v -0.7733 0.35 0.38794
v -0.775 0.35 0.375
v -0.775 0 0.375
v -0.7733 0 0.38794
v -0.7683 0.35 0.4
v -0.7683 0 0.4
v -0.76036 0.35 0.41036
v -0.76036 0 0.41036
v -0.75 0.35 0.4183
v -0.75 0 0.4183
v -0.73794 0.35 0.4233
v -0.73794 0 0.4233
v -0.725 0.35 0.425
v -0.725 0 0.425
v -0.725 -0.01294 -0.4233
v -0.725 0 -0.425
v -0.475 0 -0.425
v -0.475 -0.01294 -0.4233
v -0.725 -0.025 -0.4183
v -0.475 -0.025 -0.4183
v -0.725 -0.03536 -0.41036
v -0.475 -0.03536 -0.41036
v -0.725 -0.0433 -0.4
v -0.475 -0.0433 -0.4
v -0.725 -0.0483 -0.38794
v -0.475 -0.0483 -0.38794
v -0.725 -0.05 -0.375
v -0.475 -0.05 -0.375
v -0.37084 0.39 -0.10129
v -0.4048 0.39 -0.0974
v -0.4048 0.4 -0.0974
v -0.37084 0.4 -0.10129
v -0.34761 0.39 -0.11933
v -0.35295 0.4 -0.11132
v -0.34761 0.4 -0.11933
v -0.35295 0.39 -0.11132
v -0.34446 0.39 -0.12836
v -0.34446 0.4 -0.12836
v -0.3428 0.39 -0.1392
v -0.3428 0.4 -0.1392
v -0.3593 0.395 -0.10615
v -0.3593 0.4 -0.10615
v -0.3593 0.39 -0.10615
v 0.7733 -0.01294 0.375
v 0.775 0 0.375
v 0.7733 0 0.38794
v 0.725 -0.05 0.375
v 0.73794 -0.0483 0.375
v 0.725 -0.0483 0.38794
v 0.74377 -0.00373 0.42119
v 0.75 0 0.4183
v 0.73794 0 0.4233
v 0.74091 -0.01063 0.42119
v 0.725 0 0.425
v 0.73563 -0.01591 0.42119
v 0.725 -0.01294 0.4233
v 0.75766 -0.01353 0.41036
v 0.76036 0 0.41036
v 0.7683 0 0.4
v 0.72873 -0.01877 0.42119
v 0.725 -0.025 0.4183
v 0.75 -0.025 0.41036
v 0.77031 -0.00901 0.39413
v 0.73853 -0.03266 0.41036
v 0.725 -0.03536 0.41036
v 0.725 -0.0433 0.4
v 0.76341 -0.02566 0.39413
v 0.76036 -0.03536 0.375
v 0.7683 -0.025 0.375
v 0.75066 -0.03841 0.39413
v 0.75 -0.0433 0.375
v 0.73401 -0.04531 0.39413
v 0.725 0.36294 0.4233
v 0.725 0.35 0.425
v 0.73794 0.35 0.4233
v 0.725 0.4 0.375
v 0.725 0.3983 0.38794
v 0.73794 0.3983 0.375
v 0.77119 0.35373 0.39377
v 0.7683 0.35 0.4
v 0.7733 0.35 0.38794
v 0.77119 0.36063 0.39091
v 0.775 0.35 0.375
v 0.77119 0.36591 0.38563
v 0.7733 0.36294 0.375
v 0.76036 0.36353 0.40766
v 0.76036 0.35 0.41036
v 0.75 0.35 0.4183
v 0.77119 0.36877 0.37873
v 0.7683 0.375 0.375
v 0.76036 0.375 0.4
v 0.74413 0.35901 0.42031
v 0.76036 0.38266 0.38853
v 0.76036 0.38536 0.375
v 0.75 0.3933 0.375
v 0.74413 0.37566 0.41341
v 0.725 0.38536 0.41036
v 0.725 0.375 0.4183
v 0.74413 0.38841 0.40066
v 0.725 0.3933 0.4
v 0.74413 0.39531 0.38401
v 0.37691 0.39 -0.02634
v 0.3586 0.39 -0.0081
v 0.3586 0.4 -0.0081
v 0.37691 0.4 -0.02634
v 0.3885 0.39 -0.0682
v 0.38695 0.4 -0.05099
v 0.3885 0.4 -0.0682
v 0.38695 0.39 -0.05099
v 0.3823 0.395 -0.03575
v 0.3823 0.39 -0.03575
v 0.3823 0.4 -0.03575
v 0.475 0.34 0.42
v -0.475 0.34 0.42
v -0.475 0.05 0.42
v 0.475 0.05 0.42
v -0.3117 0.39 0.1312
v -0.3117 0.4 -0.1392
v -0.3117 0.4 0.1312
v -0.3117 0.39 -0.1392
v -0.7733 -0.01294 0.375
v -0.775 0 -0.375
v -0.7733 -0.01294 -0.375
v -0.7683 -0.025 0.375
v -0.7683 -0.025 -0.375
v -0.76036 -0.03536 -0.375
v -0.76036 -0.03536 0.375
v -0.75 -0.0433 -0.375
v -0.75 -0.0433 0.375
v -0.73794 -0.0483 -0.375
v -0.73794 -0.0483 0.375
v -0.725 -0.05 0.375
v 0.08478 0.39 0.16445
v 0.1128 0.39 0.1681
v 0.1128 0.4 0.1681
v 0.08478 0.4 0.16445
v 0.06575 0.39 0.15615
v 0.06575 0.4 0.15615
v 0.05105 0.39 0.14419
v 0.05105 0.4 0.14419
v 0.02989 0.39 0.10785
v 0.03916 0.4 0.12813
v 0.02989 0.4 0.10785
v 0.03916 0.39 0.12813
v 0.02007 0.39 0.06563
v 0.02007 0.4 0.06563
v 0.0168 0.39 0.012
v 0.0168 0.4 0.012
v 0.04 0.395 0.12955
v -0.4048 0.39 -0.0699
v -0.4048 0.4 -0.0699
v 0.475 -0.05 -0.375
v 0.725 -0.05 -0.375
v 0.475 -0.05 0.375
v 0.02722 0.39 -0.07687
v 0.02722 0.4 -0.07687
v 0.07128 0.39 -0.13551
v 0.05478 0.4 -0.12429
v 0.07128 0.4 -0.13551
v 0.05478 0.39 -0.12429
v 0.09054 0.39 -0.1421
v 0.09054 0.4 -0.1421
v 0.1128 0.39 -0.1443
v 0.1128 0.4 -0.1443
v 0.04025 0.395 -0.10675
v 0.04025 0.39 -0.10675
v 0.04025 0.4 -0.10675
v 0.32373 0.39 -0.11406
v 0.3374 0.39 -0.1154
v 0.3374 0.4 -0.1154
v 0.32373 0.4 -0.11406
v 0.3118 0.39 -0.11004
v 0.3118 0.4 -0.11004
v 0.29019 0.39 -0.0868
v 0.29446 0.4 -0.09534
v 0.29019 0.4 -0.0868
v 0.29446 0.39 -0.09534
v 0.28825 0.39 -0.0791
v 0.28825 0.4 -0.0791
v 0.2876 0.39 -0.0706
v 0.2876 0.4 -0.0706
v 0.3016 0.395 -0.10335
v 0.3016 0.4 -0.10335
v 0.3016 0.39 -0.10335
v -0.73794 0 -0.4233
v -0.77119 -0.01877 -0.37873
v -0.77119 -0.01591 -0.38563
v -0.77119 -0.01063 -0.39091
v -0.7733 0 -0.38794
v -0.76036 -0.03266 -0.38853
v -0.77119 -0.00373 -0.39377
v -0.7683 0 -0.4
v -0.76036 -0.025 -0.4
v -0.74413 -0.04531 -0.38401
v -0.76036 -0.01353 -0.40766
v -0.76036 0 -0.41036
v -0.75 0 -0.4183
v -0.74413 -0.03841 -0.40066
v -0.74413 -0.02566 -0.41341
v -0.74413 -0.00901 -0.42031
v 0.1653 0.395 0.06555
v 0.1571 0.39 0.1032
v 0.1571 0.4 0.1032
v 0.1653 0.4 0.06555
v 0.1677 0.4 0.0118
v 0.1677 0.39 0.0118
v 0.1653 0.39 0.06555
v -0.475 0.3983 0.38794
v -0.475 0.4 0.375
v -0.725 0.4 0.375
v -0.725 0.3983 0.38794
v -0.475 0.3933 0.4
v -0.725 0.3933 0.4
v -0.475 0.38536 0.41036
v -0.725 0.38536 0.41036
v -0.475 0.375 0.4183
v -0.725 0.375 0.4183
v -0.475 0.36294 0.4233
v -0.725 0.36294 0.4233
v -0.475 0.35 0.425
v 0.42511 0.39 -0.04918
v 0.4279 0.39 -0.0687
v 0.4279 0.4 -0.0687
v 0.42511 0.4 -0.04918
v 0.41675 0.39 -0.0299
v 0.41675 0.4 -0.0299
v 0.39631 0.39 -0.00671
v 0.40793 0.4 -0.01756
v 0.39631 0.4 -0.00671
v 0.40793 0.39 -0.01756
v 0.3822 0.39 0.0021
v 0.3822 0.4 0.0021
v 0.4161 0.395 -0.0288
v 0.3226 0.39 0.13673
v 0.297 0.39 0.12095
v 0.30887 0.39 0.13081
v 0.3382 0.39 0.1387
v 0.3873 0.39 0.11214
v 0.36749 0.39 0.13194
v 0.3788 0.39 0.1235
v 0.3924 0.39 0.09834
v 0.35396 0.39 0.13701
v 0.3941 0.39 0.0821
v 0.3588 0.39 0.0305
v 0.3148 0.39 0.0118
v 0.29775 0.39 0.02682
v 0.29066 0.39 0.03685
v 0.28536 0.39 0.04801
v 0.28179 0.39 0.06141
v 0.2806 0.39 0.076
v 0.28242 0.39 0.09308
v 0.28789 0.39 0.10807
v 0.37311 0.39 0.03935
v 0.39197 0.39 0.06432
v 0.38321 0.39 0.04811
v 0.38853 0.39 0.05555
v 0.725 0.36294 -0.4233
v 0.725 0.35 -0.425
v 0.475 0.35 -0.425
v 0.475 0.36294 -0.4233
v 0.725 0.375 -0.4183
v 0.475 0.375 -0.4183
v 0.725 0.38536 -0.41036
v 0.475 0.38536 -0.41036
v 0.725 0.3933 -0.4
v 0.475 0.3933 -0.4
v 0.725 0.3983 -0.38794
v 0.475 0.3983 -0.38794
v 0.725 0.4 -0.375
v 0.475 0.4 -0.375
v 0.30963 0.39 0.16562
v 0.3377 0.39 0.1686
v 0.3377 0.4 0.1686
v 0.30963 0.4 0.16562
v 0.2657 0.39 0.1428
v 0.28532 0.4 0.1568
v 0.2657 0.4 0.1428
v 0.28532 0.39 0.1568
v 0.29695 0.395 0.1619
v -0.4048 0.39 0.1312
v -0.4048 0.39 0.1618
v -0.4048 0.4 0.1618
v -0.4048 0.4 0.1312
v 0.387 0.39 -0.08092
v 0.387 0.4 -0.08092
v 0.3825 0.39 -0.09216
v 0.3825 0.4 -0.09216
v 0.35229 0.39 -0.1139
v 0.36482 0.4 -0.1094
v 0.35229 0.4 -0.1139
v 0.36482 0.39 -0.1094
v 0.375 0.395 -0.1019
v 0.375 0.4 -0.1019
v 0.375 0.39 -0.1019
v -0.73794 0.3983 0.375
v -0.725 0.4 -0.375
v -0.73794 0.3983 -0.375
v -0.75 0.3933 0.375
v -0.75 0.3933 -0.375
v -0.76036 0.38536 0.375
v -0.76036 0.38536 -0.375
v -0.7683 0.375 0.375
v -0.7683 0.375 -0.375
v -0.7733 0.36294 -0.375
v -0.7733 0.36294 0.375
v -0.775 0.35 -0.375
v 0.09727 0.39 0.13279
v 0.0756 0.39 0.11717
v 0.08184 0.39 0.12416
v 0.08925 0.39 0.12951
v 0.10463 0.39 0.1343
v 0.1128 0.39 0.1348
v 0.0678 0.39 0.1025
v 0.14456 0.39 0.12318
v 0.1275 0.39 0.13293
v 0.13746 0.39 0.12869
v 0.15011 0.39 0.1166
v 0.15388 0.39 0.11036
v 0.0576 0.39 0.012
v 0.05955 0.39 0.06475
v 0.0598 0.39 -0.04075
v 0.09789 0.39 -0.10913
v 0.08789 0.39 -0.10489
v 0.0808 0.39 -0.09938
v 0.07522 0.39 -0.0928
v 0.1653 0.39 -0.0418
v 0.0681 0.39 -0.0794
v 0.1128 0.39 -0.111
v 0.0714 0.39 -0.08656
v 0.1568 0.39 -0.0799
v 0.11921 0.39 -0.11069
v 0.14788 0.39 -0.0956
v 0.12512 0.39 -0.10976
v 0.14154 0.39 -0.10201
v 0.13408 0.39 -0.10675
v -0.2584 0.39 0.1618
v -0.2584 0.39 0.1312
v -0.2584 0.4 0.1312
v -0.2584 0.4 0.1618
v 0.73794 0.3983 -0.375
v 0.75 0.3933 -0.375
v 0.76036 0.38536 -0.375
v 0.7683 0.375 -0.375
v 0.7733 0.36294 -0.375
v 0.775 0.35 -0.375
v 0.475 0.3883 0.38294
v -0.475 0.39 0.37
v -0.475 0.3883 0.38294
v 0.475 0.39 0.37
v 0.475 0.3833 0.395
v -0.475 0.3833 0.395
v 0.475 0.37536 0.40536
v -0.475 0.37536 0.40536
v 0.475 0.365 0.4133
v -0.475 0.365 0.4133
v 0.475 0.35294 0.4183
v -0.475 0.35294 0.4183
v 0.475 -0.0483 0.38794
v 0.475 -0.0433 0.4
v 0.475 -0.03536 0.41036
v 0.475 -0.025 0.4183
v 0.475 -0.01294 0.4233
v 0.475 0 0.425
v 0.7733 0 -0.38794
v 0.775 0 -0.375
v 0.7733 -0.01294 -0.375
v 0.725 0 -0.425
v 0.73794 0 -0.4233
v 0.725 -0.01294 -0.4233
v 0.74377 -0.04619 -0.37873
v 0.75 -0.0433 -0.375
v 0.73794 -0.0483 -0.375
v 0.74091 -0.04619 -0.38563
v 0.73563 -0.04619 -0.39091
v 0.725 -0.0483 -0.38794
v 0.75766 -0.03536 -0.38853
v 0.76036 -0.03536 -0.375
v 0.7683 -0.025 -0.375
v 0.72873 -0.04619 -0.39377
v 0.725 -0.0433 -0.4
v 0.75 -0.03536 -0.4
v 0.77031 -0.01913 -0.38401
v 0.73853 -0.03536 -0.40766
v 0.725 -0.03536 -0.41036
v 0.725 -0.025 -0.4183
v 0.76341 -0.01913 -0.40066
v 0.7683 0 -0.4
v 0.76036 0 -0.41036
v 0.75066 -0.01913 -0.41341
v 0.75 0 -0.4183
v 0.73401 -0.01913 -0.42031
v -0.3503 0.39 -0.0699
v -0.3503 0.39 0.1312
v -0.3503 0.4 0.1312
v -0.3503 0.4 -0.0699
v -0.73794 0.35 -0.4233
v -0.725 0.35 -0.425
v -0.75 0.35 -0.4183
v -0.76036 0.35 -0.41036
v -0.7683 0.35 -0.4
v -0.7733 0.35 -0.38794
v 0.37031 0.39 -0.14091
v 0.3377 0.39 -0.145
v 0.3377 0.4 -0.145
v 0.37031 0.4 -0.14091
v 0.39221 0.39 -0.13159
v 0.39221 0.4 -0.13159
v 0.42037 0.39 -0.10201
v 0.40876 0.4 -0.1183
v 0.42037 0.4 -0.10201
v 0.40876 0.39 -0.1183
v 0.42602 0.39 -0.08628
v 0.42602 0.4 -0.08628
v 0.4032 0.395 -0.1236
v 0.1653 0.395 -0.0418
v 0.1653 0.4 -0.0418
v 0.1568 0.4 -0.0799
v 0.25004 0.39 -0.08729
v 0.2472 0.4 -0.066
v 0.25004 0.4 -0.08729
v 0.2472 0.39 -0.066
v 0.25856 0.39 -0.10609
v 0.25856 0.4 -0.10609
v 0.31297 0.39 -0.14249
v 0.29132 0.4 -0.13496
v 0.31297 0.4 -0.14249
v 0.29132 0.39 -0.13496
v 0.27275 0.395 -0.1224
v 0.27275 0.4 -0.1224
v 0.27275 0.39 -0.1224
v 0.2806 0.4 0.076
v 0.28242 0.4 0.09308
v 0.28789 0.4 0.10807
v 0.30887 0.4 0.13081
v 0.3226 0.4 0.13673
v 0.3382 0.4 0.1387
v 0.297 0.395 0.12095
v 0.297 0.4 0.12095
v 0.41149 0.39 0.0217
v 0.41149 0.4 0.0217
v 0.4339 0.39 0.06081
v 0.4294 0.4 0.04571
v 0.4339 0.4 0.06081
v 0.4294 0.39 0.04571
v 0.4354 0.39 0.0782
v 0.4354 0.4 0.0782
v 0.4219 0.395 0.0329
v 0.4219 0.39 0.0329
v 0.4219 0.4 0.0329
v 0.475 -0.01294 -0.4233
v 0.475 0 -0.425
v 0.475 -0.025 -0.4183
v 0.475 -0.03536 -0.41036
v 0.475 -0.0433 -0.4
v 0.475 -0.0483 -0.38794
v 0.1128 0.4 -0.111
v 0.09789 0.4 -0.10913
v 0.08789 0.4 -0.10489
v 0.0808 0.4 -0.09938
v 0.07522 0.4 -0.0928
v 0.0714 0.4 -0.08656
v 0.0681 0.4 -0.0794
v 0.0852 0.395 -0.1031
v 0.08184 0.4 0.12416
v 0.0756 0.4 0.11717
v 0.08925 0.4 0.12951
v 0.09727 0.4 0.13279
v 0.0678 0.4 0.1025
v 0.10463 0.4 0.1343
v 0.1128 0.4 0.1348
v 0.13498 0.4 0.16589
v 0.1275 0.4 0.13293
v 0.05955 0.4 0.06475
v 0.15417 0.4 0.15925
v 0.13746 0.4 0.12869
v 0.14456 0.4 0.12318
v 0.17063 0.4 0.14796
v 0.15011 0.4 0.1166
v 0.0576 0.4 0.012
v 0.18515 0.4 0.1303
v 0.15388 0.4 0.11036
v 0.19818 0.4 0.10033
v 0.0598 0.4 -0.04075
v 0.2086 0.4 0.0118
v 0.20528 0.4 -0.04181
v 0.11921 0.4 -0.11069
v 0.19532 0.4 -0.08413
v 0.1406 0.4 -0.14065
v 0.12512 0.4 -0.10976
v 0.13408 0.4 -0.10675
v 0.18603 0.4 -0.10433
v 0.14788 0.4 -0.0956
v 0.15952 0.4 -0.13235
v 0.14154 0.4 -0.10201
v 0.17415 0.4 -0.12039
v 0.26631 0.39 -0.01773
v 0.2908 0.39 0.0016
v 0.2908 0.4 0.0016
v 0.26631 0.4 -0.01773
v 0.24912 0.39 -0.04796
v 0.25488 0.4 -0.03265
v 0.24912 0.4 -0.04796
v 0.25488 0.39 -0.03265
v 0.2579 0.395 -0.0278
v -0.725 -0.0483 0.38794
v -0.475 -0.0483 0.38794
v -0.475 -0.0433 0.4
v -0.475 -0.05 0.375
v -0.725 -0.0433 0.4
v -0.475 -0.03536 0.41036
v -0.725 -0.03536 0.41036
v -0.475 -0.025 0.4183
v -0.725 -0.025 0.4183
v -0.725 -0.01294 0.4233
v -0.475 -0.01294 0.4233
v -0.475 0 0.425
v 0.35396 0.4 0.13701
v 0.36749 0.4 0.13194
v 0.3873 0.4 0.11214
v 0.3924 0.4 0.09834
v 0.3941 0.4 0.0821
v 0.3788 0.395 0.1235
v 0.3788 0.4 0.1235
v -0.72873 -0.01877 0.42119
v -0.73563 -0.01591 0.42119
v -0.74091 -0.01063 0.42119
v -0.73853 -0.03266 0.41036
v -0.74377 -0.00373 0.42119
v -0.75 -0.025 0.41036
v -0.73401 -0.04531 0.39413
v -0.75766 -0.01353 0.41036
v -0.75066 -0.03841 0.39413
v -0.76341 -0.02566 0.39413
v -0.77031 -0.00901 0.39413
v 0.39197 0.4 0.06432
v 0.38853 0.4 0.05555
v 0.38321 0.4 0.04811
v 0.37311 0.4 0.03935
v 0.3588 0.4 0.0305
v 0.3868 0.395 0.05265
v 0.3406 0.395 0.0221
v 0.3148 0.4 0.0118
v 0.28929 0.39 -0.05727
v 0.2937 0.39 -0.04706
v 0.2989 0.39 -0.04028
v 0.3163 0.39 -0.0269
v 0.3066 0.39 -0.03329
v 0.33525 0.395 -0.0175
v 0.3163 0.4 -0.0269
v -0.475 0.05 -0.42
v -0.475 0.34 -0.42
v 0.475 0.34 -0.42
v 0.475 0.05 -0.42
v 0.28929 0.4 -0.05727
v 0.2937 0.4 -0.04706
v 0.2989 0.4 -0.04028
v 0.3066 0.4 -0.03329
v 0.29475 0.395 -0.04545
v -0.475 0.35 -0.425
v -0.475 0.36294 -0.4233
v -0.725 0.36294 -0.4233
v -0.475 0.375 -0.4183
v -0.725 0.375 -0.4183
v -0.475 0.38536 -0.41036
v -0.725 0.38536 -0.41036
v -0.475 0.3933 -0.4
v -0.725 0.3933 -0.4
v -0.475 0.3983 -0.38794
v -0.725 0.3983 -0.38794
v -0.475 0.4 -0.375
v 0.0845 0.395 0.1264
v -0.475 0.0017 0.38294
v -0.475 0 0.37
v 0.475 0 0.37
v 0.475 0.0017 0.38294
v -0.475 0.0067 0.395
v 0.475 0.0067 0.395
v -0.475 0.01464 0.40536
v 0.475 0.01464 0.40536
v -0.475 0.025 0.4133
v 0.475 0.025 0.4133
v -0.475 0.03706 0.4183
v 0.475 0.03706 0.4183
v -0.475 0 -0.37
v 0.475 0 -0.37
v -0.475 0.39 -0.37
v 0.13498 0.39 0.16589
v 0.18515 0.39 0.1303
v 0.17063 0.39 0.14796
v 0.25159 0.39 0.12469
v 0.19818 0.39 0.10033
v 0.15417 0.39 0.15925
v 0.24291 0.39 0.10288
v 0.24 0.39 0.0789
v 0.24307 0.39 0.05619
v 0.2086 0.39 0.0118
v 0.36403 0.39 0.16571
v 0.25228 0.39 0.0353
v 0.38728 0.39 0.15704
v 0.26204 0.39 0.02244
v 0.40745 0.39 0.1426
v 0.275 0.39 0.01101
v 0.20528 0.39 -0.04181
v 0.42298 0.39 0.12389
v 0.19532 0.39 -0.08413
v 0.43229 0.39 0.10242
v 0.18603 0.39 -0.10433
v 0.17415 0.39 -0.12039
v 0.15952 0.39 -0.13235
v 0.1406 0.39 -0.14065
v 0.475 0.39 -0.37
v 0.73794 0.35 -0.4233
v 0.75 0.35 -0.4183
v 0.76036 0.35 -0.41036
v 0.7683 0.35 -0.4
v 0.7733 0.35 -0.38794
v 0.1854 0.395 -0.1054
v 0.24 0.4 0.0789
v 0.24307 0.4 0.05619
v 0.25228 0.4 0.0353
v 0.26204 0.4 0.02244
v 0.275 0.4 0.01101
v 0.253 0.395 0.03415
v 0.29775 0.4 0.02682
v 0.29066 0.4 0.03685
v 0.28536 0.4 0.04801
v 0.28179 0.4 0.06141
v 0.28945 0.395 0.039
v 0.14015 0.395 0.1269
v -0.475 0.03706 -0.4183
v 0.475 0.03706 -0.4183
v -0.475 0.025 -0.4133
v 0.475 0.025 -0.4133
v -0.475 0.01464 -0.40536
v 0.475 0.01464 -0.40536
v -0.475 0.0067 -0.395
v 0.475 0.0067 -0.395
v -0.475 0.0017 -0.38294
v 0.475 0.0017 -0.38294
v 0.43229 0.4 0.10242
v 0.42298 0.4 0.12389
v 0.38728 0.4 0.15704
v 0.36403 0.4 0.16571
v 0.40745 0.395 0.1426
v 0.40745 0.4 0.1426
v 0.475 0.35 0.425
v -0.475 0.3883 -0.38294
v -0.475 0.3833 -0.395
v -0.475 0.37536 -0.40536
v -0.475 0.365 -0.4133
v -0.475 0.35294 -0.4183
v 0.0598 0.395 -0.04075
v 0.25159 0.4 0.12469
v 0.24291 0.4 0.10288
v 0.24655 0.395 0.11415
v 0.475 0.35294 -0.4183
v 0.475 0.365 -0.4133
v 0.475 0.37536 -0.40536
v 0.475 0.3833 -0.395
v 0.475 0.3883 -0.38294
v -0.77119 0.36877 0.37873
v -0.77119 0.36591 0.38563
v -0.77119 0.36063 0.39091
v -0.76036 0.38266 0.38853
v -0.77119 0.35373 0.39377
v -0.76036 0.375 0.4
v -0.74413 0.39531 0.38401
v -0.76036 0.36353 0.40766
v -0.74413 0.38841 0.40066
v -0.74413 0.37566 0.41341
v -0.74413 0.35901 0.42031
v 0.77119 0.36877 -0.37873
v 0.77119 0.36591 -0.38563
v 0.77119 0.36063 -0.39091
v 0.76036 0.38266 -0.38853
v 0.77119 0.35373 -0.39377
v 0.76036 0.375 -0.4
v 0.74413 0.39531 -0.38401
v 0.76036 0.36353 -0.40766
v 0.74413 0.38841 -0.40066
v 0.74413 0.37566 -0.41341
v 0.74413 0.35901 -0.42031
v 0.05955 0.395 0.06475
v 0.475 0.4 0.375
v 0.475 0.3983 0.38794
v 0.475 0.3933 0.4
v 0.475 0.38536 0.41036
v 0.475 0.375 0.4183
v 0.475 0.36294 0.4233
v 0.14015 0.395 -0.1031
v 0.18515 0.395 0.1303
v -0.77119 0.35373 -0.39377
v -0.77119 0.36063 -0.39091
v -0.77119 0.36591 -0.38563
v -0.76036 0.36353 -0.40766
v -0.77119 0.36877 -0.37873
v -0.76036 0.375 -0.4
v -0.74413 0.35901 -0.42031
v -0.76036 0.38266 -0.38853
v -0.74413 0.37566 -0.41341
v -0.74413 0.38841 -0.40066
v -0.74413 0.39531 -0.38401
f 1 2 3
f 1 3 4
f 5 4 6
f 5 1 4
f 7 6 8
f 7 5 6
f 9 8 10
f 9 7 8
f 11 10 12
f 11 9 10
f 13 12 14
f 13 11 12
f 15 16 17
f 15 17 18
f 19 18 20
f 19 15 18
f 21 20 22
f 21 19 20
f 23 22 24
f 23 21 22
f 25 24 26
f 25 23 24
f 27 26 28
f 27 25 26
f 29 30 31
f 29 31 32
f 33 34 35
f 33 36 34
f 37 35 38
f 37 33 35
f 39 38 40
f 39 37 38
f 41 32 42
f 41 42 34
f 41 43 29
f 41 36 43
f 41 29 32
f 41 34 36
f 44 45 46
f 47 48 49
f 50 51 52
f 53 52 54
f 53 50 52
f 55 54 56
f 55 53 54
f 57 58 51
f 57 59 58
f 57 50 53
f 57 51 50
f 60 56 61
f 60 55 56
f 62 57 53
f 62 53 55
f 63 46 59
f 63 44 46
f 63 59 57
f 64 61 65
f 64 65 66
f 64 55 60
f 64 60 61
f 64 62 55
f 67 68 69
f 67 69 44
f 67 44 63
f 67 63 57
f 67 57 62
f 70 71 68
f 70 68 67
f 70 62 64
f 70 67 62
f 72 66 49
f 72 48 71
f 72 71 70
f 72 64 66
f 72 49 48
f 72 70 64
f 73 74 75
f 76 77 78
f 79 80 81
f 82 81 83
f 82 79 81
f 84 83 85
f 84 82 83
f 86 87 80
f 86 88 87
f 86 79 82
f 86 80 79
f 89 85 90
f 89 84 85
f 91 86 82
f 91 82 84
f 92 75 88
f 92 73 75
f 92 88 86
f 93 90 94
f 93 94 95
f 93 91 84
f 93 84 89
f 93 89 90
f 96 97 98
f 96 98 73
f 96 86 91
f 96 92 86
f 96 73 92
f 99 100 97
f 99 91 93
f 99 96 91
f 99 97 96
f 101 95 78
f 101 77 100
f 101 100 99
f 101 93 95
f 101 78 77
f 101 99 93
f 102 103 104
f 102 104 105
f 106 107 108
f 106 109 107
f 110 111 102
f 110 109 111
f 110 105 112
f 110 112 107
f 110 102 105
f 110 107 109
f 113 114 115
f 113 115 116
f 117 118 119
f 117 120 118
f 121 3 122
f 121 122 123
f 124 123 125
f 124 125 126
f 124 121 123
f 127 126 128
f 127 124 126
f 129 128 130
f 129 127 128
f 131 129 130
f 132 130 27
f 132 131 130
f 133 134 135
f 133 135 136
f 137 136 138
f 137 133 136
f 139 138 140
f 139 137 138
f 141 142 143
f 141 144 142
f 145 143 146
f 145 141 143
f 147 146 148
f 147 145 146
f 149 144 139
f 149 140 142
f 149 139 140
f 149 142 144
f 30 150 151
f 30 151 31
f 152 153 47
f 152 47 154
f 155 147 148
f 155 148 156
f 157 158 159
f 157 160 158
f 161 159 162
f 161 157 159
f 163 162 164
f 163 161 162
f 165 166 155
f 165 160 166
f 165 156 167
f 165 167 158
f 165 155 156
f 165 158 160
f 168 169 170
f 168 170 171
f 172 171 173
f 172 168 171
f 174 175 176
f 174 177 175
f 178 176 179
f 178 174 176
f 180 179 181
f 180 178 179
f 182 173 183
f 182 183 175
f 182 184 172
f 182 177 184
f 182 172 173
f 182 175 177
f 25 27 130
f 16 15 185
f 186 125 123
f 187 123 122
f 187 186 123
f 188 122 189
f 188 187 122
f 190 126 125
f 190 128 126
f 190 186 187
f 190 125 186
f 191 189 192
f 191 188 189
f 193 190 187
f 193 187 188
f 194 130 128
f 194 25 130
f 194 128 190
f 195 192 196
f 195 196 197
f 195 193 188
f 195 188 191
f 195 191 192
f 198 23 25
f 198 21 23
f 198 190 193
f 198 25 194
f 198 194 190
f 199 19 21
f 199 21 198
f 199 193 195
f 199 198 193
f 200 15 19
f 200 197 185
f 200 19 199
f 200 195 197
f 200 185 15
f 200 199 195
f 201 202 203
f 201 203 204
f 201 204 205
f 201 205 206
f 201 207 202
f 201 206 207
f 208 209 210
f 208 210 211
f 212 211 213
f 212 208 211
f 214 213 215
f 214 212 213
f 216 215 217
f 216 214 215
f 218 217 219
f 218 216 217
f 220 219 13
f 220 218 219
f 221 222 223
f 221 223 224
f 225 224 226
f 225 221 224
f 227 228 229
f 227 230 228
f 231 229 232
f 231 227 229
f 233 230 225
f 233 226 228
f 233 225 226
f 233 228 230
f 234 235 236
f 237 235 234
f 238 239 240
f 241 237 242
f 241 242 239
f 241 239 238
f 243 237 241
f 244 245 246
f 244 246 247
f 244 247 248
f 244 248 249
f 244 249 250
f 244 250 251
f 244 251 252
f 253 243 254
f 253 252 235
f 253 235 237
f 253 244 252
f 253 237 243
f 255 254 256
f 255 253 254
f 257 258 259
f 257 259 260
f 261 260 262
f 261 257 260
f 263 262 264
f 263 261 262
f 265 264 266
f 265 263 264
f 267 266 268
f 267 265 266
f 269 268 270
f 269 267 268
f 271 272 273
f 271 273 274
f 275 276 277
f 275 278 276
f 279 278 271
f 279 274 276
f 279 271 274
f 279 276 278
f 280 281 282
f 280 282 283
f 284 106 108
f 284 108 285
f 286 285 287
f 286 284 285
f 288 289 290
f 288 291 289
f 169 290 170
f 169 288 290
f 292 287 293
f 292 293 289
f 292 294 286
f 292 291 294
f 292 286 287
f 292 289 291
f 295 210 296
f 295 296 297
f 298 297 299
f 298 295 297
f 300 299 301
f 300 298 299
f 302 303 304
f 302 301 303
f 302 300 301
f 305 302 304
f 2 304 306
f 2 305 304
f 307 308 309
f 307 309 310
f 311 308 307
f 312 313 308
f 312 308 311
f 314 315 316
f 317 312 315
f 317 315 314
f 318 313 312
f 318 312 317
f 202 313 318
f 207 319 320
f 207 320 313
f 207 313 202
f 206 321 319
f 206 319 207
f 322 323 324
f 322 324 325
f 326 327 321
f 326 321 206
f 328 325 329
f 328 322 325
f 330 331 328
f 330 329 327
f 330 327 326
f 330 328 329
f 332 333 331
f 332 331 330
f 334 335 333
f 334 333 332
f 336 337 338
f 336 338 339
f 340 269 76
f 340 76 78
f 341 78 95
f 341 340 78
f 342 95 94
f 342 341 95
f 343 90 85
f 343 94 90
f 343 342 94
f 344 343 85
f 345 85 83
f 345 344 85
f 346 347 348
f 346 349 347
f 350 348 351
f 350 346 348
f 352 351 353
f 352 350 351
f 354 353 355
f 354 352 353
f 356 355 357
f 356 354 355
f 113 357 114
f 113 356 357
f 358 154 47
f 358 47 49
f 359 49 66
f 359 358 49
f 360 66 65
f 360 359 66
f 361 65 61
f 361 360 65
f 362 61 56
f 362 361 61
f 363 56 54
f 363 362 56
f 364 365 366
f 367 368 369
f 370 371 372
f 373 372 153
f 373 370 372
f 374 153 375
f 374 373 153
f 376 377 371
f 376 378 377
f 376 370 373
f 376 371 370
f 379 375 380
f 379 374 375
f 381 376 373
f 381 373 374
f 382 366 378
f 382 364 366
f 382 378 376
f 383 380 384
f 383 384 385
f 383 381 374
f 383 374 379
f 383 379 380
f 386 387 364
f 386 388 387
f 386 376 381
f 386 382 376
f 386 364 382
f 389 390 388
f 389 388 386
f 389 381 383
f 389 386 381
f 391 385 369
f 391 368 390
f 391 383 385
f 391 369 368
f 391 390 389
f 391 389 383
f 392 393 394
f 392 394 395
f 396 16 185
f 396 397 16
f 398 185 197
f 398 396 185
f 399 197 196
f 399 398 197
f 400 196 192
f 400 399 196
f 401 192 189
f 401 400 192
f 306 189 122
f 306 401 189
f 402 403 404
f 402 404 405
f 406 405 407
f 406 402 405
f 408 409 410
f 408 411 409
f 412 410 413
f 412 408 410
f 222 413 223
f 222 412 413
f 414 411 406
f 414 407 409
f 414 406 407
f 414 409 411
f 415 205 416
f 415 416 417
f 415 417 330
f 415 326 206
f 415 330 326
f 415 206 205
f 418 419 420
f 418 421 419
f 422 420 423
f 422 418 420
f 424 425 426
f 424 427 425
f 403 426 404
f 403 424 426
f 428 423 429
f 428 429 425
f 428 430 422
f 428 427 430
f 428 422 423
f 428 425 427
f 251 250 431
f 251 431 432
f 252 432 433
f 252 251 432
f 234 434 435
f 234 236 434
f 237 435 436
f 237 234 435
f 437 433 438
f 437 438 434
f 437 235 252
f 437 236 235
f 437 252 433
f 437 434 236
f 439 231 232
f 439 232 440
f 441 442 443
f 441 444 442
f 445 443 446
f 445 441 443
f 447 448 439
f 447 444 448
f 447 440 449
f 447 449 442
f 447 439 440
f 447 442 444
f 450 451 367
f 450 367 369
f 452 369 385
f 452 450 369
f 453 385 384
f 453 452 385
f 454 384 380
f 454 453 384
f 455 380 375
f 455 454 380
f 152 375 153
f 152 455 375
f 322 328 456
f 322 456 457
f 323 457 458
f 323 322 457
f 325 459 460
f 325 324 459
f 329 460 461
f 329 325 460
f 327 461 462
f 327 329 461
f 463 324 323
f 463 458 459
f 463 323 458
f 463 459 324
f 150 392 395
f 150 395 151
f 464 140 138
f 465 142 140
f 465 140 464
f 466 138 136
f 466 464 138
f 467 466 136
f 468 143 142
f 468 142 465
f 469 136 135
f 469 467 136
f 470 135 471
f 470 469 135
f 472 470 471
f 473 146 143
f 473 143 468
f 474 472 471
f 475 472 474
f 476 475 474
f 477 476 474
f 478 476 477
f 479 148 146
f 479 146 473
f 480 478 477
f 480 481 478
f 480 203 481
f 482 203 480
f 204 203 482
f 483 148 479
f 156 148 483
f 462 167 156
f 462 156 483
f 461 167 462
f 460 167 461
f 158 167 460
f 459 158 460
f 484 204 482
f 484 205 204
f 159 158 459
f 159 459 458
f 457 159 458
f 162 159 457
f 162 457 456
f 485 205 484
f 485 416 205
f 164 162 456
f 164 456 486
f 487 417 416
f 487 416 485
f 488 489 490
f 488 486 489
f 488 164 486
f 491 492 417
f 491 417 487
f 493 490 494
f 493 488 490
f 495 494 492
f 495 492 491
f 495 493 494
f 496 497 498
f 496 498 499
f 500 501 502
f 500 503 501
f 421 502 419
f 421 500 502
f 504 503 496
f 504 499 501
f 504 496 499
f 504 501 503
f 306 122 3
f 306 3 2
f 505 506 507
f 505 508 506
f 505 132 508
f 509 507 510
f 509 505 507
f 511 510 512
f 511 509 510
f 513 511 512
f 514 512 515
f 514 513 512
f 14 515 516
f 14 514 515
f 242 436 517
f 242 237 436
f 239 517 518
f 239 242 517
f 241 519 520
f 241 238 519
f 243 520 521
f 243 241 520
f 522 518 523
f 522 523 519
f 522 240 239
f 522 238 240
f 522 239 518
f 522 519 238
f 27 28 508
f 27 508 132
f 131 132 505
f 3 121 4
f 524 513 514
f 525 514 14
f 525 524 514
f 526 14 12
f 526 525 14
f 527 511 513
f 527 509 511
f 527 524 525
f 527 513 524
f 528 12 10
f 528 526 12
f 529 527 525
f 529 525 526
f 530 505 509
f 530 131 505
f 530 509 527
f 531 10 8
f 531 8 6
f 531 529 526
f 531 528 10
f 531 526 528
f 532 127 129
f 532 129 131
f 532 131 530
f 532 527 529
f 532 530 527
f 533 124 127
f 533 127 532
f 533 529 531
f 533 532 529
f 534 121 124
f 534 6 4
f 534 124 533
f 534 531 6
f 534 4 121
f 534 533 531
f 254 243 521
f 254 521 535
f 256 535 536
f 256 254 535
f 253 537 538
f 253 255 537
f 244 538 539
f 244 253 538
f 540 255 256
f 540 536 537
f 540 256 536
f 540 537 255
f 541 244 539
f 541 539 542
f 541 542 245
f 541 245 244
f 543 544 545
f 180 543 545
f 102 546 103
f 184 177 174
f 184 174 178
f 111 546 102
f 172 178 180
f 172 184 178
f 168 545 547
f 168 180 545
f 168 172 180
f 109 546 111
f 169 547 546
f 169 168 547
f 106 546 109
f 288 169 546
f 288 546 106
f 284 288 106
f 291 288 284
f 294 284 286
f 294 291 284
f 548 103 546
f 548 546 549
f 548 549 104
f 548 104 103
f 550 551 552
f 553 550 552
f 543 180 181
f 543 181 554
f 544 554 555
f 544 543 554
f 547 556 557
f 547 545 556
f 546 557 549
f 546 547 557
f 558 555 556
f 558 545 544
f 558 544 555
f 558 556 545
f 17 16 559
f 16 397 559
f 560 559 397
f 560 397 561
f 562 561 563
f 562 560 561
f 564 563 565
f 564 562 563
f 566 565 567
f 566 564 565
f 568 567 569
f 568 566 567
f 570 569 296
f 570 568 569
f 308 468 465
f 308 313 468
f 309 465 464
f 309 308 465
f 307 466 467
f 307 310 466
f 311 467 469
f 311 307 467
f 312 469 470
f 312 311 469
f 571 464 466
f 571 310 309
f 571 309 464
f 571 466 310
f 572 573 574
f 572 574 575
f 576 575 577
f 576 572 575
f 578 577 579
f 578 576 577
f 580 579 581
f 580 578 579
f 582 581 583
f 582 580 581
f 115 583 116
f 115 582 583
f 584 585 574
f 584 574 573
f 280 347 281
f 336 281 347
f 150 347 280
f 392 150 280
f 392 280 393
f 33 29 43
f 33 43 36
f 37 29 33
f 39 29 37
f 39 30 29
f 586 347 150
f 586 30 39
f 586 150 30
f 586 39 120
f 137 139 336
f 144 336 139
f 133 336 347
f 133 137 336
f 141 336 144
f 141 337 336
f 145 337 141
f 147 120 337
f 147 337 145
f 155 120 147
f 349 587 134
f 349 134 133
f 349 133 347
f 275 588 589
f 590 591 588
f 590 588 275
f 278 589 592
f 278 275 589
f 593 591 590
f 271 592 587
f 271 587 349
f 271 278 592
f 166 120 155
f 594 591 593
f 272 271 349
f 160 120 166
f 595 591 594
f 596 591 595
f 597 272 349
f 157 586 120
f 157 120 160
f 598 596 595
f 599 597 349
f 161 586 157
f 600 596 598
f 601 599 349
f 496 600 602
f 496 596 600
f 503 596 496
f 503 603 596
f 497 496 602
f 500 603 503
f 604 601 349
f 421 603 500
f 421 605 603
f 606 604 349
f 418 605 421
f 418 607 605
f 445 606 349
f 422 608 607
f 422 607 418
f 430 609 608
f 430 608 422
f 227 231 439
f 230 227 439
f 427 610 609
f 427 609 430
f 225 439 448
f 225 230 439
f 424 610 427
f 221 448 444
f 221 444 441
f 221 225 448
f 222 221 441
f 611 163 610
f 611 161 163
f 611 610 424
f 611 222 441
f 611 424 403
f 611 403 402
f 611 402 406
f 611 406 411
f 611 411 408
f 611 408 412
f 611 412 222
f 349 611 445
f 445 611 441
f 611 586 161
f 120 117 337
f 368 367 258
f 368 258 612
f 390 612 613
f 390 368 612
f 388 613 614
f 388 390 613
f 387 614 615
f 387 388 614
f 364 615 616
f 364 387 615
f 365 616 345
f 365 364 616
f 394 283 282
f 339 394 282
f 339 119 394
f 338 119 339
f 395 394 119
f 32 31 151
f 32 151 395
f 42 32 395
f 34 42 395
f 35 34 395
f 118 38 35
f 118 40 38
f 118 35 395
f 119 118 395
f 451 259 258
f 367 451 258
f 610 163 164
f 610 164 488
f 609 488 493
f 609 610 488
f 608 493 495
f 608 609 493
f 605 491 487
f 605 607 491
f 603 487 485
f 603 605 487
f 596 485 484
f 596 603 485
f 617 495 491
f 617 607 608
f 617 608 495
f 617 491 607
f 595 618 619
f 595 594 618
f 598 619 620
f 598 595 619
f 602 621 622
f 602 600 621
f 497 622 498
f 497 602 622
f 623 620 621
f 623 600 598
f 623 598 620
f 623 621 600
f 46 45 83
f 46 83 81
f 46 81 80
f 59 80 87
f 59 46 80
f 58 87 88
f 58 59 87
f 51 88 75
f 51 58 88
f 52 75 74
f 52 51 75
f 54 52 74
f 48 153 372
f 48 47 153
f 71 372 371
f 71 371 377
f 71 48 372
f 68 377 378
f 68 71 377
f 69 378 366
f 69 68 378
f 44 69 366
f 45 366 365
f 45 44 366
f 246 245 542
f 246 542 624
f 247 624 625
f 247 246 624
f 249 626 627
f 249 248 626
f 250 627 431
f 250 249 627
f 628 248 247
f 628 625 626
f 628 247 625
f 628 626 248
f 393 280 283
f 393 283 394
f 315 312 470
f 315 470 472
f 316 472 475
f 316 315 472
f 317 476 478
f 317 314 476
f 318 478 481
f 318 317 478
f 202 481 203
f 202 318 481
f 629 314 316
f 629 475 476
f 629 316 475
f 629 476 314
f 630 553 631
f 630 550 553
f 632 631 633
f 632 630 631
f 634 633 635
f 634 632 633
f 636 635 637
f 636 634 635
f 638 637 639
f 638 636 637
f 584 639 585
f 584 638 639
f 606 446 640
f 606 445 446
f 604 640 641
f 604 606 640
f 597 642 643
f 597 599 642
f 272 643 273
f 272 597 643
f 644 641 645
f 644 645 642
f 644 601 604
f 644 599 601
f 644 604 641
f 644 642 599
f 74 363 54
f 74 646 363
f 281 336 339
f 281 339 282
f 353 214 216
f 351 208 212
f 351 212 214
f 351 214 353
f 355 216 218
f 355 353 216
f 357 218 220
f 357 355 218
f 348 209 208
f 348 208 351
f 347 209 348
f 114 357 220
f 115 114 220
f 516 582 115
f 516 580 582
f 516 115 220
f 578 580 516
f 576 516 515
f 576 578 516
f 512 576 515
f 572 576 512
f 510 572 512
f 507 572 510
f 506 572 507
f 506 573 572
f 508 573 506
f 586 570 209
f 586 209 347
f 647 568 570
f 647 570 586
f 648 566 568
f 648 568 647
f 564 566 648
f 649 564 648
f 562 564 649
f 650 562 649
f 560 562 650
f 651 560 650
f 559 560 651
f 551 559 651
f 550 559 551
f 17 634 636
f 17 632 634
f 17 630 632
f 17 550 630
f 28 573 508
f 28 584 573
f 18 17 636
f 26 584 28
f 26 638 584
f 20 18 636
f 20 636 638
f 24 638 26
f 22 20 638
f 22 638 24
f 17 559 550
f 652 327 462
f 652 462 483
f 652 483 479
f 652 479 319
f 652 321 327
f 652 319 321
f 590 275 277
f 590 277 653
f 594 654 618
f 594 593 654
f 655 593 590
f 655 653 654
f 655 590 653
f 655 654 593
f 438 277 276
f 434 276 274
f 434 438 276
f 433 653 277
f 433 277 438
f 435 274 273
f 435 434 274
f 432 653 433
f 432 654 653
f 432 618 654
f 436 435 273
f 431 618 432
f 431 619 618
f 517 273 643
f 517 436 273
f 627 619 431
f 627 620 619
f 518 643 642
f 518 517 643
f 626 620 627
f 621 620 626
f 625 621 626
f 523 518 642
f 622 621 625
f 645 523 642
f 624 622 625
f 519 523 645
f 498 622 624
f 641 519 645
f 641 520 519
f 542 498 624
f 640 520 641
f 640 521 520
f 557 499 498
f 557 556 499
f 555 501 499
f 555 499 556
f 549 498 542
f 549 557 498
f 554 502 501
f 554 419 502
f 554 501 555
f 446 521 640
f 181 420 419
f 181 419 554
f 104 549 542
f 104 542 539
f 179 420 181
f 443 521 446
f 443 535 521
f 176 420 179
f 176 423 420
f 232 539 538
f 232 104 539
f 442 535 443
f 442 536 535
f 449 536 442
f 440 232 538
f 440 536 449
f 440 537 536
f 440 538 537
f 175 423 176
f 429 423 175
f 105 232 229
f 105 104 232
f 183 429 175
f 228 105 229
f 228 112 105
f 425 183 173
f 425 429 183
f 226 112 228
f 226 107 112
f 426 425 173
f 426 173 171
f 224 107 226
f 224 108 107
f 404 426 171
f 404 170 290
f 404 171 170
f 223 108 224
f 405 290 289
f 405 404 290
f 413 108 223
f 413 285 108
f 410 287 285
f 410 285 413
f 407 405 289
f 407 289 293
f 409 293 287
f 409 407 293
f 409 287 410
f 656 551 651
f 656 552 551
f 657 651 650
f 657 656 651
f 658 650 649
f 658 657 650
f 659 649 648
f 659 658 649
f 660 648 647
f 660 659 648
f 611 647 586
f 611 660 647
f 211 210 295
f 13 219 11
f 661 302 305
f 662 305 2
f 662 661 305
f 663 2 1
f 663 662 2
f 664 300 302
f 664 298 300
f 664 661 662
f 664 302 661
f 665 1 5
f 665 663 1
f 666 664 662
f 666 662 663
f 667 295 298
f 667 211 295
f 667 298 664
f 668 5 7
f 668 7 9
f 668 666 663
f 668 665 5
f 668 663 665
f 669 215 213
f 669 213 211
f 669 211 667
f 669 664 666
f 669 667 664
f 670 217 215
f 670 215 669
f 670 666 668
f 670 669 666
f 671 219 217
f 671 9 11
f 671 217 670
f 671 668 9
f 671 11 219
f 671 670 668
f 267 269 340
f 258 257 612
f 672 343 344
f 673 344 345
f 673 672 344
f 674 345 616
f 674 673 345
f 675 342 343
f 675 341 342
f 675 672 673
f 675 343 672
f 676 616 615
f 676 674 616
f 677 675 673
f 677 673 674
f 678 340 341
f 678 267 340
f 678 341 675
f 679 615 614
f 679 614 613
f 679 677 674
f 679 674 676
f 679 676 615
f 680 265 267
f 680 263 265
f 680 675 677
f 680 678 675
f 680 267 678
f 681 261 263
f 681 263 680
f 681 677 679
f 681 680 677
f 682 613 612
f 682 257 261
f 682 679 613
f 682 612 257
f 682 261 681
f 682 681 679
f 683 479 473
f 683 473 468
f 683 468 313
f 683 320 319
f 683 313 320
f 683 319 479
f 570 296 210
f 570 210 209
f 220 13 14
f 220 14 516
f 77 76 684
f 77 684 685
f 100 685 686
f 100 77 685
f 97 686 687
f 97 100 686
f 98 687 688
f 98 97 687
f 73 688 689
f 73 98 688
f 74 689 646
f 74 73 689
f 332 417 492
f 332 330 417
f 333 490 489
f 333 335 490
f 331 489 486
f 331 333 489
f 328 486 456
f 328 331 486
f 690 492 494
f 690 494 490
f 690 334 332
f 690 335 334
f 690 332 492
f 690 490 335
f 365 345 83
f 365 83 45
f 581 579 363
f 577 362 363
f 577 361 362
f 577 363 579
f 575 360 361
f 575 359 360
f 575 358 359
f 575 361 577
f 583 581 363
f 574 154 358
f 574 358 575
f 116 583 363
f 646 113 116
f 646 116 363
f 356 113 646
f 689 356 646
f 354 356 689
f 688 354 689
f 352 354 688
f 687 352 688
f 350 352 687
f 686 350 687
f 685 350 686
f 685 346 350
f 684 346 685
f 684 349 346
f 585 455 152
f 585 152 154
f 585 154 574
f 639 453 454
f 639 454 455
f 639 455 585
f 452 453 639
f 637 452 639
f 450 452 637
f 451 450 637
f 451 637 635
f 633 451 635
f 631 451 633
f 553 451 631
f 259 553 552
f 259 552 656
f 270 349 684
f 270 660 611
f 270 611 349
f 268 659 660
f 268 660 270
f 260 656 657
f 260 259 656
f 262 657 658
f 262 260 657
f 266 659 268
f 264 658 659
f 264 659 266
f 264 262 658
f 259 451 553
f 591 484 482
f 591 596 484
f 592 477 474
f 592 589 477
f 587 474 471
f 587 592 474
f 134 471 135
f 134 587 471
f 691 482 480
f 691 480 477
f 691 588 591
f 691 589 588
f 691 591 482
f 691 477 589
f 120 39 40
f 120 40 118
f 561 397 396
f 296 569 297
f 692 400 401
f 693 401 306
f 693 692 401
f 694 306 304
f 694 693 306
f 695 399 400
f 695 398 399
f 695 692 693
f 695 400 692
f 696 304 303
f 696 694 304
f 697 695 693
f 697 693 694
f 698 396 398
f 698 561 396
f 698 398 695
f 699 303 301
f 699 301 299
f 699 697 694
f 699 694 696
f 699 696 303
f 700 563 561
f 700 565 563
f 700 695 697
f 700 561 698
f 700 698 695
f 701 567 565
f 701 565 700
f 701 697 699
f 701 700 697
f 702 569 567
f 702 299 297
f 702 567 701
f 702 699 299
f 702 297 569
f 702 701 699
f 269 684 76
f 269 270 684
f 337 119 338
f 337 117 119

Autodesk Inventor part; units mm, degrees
ref_plane "YZ Plane" through (0, 0, 0) normal (1, 0, 0) x (0, 1, 0)
ref_plane "XZ Plane" through (0, 0, 0) normal (0, 1, 0) x (-1, 0, 0)
ref_plane "XY Plane" through (0, 0, 0) normal (0, 0, 1) x (1, 0, 0)
sketch "Sketch1" plane through (0, 0, 0) normal (0, 0, 1) x (1, 0, 0)
  line L0 (-0.775, 0.4) -> (-0.475, 0.4)
  line L1 (-0.475, 0.4) -> (-0.475, -0.05)
  line L2 (-0.475, -0.05) -> (-0.775, -0.05)
  line L3 (-0.775, -0.05) -> (-0.775, 0.4)
  line L4 (-0.475, 0.39) -> (0.475, 0.39)
  line L5 (0.475, 0.39) -> (0.475, 0)
  line L6 (0.475, 0) -> (-0.475, 0)
  line L7 (-0.475, 0) -> (-0.475, 0.39)
  line L8 (0.475, 0.4) -> (0.775, 0.4)
  line L9 (0.775, 0.4) -> (0.775, -0.05)
  line L10 (0.775, -0.05) -> (0.475, -0.05)
  line L11 (0.475, -0.05) -> (0.475, 0.4)
  point P0 (0, 0)
  point P1 (0, 0.39)
  point P2 (0, 0)
  dimension "d0" = 1.55
  dimension "d1" = 0.45
  dimension "d2" = 0.3
  dimension "d3" = 0.05
  dimension "d6" = 0.01
extrude "Extrusion1" add sketch "Sketch1" along normal mid plane 0.85 contours L0 L1 L2 L3 | L11 L8 L9 L10 L5
extrude "Extrusion2" add sketch "Sketch1" along normal mid plane 0.84 contours L4 L5 L6 L1
sketch "Sketch3" plane through (-0.475, 0.39, 0.42) normal (0, 1, 0) x (1, 0, 0)
  line L0 (0, 0) -> (0, 0.84) projected
  line L1 (0.95, 0) -> (0, 0) projected
  line L2 (0.95, 0.84) -> (0.95, 0) projected
  line L3 (0, 0.84) -> (0.95, 0.84) projected
  line L4 (0.95, 0.845) -> (0.95, -0.005) construction
  line L5 (0.95, 0.2582) -> (0, 0.2582) construction
  line L6 (0, 0.845) -> (0, -0.005) construction
  line L7 (0.2166, 0.2582) -> (0.0702, 0.2582)
  line L8 (0.0702, 0.2582) -> (0.0702, 0.2888)
  line L9 (0.0702, 0.2888) -> (0.1247, 0.2888)
  line L10 (0.1247, 0.2888) -> (0.1247, 0.4899)
  line L11 (0.1247, 0.4899) -> (0.0702, 0.4899)
  line L12 (0.0702, 0.4899) -> (0.0702, 0.5174)
  spline S0 degree 2 poles (0.0702, 0.5174) (0.1011, 0.5174) (0.1303, 0.5349) (0.1322, 0.5592) knots 0 0 0 1 2 2 2
  line L13 (0.1322, 0.5592) -> (0.1633, 0.5592)
  line L14 (0.1633, 0.5592) -> (0.1633, 0.2888)
  line L15 (0.1633, 0.2888) -> (0.2166, 0.2888)
  line L16 (0.2166, 0.2888) -> (0.2166, 0.2582)
  spline S1 degree 2 poles (0.4614, 0.3555) (0.4614, 0.3324) (0.4461, 0.2932) (0.4332, 0.2801) knots 0 0 0 1 2 2 2
  spline S2 degree 2 poles (0.4332, 0.2801) (0.4198, 0.2662) (0.3863, 0.2519) (0.3661, 0.2519) knots 0 0 0 1 2 2 2
  spline S3 degree 2 poles (0.3661, 0.2519) (0.3459, 0.2519) (0.3126, 0.2655) (0.3, 0.2791) knots 0 0 0 1 2 2 2
  spline S4 degree 2 poles (0.3, 0.2791) (0.2844, 0.2954) (0.2669, 0.3501) (0.2669, 0.39) knots 0 0 0 1 2 2 2
  spline S5 degree 2 poles (0.2669, 0.39) (0.2669, 0.4291) (0.2829, 0.4921) (0.2997, 0.5154) knots 0 0 0 1 2 2 2
  spline S6 degree 2 poles (0.2997, 0.5154) (0.316, 0.5383) (0.3675, 0.5638) (0.4013, 0.5638) knots 0 0 0 1 2 2 2
  spline S7 degree 2 poles (0.4013, 0.5638) (0.4113, 0.5638) (0.4288, 0.5619) (0.4354, 0.5597) knots 0 0 0 1 2 2 2
  line L17 (0.4354, 0.5597) -> (0.4354, 0.521)
  line L18 (0.4354, 0.521) -> (0.4337, 0.521)
  spline S8 degree 2 poles (0.4337, 0.521) (0.4281, 0.5239) (0.4077, 0.529) (0.396, 0.529) knots 0 0 0 1 2 2 2
  spline S9 degree 2 poles (0.396, 0.529) (0.3585, 0.529) (0.3126, 0.4785) (0.3082, 0.4289) knots 0 0 0 1 2 2 2
  spline S10 degree 2 poles (0.3082, 0.4289) (0.3226, 0.4388) (0.3527, 0.4498) (0.3707, 0.4498) knots 0 0 0 1 2 2 2
  spline S11 degree 2 poles (0.3707, 0.4498) (0.3882, 0.4498) (0.4145, 0.4427) (0.4288, 0.432) knots 0 0 0 1 2 2 2
  spline S12 degree 2 poles (0.4288, 0.432) (0.4453, 0.4196) (0.4614, 0.3812) (0.4614, 0.3555) knots 0 0 0 1 2 2 2
  spline S13 degree 2 poles (0.4205, 0.3537) (0.4205, 0.3722) (0.4108, 0.3973) (0.4001, 0.406) knots 0 0 0 1 2 2 2
  spline S14 degree 2 poles (0.4001, 0.406) (0.3921, 0.4123) (0.3722, 0.4165) (0.3617, 0.4165) knots 0 0 0 1 2 2 2
  spline S15 degree 2 poles (0.3617, 0.4165) (0.3476, 0.4165) (0.3211, 0.408) (0.3082, 0.3999) knots 0 0 0 1 2 2 2
  spline S16 degree 2 poles (0.3082, 0.3999) (0.308, 0.3956) (0.3075, 0.3873) (0.3075, 0.381) knots 0 0 0 1 2 2 2
  spline S17 degree 2 poles (0.3075, 0.381) (0.3075, 0.3499) (0.3197, 0.3117) (0.3289, 0.3017) knots 0 0 0 1 2 2 2
  spline S18 degree 2 poles (0.3289, 0.3017) (0.3374, 0.2922) (0.3559, 0.2847) (0.3663, 0.2847) knots 0 0 0 1 2 2 2
  spline S19 degree 2 poles (0.3663, 0.2847) (0.3906, 0.2847) (0.4205, 0.3192) (0.4205, 0.3537) knots 0 0 0 1 2 2 2
  spline S20 degree 2 poles (0.6836, 0.4082) (0.6836, 0.3275) (0.6367, 0.2519) (0.5878, 0.2519) knots 0 0 0 1 2 2 2
  spline S21 degree 2 poles (0.5878, 0.2519) (0.5382, 0.2519) (0.4918, 0.329) (0.4918, 0.408) knots 0 0 0 1 2 2 2
  spline S22 degree 2 poles (0.4918, 0.408) (0.4918, 0.4892) (0.5387, 0.5643) (0.5878, 0.5643) knots 0 0 0 1 2 2 2
  spline S23 degree 2 poles (0.5878, 0.5643) (0.6372, 0.5643) (0.6836, 0.4865) (0.6836, 0.4082) knots 0 0 0 1 2 2 2
  spline S24 degree 2 poles (0.6321, 0.3168) (0.6379, 0.3316) (0.6427, 0.3773) (0.6427, 0.4082) knots 0 0 0 1 2 2 2
  spline S25 degree 2 poles (0.6427, 0.4082) (0.6427, 0.4391) (0.6379, 0.4845) (0.6318, 0.4999) knots 0 0 0 1 2 2 2
  spline S26 degree 2 poles (0.6318, 0.4999) (0.6257, 0.5152) (0.6046, 0.531) (0.5878, 0.531) knots 0 0 0 1 2 2 2
  spline S27 degree 2 poles (0.5878, 0.531) (0.571, 0.531) (0.5494, 0.5152) (0.5431, 0.4994) knots 0 0 0 1 2 2 2
  spline S28 degree 2 poles (0.5431, 0.4994) (0.537, 0.4841) (0.5326, 0.4374) (0.5326, 0.408) knots 0 0 0 1 2 2 2
  spline S29 degree 2 poles (0.5326, 0.408) (0.5326, 0.3764) (0.5365, 0.3341) (0.5428, 0.3175) knots 0 0 0 1 2 2 2
  spline S30 degree 2 poles (0.5428, 0.3175) (0.5487, 0.302) (0.5703, 0.2852) (0.5878, 0.2852) knots 0 0 0 1 2 2 2
  spline S31 degree 2 poles (0.5878, 0.2852) (0.6043, 0.2852) (0.626, 0.301) (0.6321, 0.3168) knots 0 0 0 1 2 2 2
  spline S32 degree 2 poles (0.8127, 0.2514) (0.7903, 0.2514) (0.7536, 0.2648) (0.7407, 0.2772) knots 0 0 0 1 2 2 2
  spline S33 degree 2 poles (0.7407, 0.2772) (0.7281, 0.2893) (0.715, 0.3224) (0.715, 0.3411) knots 0 0 0 1 2 2 2
  spline S34 degree 2 poles (0.715, 0.3411) (0.715, 0.3654) (0.741, 0.4063) (0.7658, 0.4184) knots 0 0 0 1 2 2 2
  line L19 (0.7658, 0.4184) -> (0.7658, 0.4196)
  spline S35 degree 2 poles (0.7658, 0.4196) (0.7436, 0.4325) (0.7222, 0.4631) (0.7222, 0.486) knots 0 0 0 1 2 2 2
  spline S36 degree 2 poles (0.7222, 0.486) (0.7222, 0.5198) (0.7733, 0.565) (0.8127, 0.565) knots 0 0 0 1 2 2 2
  spline S37 degree 2 poles (0.8127, 0.565) (0.8535, 0.565) (0.9029, 0.5222) (0.9029, 0.4887) knots 0 0 0 1 2 2 2
  spline S38 degree 2 poles (0.9029, 0.4887) (0.9029, 0.4685) (0.8793, 0.4291) (0.8572, 0.4179) knots 0 0 0 1 2 2 2
  line L20 (0.8572, 0.4179) -> (0.8572, 0.4167)
  spline S39 degree 2 poles (0.8572, 0.4167) (0.8834, 0.4046) (0.9104, 0.3696) (0.9104, 0.3418) knots 0 0 0 1 2 2 2
  spline S40 degree 2 poles (0.9104, 0.3418) (0.9104, 0.3034) (0.8545, 0.2514) (0.8127, 0.2514) knots 0 0 0 1 2 2 2
  spline S41 degree 2 poles (0.8691, 0.3379) (0.8691, 0.3564) (0.8545, 0.3783) (0.8338, 0.3895) knots 0 0 0 1 2 2 2
  spline S42 degree 2 poles (0.8338, 0.3895) (0.827, 0.3934) (0.8042, 0.4024) (0.7898, 0.4082) knots 0 0 0 1 2 2 2
  spline S43 degree 2 poles (0.7898, 0.4082) (0.7733, 0.3973) (0.7556, 0.3647) (0.7556, 0.344) knots 0 0 0 1 2 2 2
  spline S44 degree 2 poles (0.7556, 0.344) (0.7556, 0.3168) (0.7884, 0.2813) (0.8132, 0.2813) knots 0 0 0 1 2 2 2
  spline S45 degree 2 poles (0.8132, 0.2813) (0.8385, 0.2813) (0.8691, 0.3117) (0.8691, 0.3379) knots 0 0 0 1 2 2 2
  spline S46 degree 2 poles (0.8635, 0.4882) (0.8635, 0.5084) (0.8365, 0.5354) (0.8124, 0.5354) knots 0 0 0 1 2 2 2
  spline S47 degree 2 poles (0.8124, 0.5354) (0.7906, 0.5354) (0.7626, 0.5113) (0.7626, 0.4906) knots 0 0 0 1 2 2 2
  spline S48 degree 2 poles (0.7626, 0.4906) (0.7626, 0.4758) (0.7769, 0.4551) (0.7913, 0.4469) knots 0 0 0 1 2 2 2
  spline S49 degree 2 poles (0.7913, 0.4469) (0.7974, 0.4435) (0.8231, 0.4315) (0.8336, 0.4281) knots 0 0 0 1 2 2 2
  spline S50 degree 2 poles (0.8336, 0.4281) (0.8511, 0.4415) (0.8635, 0.47) (0.8635, 0.4882) knots 0 0 0 1 2 2 2
  point P0 (0.475, 0.42)
extrude "Extrusion4" add sketch "Sketch3" along normal blind 0.01 contours L7 L8 L9 L10 L11 L12 S0 L13 L14 L15 L16 | S20 S21 S22 S23 | S32 S33 S34 S35 S36 S37 S38 S39 S40
fillet "Fillet1" radius 0.05 20 edges at (-0.625, 0.4, 0.425) (0, 0.39, 0.42) (0.625, 0.4, 0.425) (-0.625, 0.4, -0.425) (0, 0.39, -0.42) (0.625, 0.4, -0.425) (0.775, 0.4, 0) (0.775, 0.175, -0.425) (0.775, -0.05, 0) (0.625, -0.05, -0.425) (0.625, -0.05, 0.425) (0.775, 0.175, 0.425) (0, 0, 0.42) (0, 0, -0.42) (-0.625, -0.05, -0.425) (-0.775, -0.05, 0) (-0.775, 0.175, 0.425) (-0.625, -0.05, 0.425) (-0.775, 0.175, -0.425) (-0.775, 0.4, 0)
properties part number "Resistor_1608-0.5mm" material "Copper"
